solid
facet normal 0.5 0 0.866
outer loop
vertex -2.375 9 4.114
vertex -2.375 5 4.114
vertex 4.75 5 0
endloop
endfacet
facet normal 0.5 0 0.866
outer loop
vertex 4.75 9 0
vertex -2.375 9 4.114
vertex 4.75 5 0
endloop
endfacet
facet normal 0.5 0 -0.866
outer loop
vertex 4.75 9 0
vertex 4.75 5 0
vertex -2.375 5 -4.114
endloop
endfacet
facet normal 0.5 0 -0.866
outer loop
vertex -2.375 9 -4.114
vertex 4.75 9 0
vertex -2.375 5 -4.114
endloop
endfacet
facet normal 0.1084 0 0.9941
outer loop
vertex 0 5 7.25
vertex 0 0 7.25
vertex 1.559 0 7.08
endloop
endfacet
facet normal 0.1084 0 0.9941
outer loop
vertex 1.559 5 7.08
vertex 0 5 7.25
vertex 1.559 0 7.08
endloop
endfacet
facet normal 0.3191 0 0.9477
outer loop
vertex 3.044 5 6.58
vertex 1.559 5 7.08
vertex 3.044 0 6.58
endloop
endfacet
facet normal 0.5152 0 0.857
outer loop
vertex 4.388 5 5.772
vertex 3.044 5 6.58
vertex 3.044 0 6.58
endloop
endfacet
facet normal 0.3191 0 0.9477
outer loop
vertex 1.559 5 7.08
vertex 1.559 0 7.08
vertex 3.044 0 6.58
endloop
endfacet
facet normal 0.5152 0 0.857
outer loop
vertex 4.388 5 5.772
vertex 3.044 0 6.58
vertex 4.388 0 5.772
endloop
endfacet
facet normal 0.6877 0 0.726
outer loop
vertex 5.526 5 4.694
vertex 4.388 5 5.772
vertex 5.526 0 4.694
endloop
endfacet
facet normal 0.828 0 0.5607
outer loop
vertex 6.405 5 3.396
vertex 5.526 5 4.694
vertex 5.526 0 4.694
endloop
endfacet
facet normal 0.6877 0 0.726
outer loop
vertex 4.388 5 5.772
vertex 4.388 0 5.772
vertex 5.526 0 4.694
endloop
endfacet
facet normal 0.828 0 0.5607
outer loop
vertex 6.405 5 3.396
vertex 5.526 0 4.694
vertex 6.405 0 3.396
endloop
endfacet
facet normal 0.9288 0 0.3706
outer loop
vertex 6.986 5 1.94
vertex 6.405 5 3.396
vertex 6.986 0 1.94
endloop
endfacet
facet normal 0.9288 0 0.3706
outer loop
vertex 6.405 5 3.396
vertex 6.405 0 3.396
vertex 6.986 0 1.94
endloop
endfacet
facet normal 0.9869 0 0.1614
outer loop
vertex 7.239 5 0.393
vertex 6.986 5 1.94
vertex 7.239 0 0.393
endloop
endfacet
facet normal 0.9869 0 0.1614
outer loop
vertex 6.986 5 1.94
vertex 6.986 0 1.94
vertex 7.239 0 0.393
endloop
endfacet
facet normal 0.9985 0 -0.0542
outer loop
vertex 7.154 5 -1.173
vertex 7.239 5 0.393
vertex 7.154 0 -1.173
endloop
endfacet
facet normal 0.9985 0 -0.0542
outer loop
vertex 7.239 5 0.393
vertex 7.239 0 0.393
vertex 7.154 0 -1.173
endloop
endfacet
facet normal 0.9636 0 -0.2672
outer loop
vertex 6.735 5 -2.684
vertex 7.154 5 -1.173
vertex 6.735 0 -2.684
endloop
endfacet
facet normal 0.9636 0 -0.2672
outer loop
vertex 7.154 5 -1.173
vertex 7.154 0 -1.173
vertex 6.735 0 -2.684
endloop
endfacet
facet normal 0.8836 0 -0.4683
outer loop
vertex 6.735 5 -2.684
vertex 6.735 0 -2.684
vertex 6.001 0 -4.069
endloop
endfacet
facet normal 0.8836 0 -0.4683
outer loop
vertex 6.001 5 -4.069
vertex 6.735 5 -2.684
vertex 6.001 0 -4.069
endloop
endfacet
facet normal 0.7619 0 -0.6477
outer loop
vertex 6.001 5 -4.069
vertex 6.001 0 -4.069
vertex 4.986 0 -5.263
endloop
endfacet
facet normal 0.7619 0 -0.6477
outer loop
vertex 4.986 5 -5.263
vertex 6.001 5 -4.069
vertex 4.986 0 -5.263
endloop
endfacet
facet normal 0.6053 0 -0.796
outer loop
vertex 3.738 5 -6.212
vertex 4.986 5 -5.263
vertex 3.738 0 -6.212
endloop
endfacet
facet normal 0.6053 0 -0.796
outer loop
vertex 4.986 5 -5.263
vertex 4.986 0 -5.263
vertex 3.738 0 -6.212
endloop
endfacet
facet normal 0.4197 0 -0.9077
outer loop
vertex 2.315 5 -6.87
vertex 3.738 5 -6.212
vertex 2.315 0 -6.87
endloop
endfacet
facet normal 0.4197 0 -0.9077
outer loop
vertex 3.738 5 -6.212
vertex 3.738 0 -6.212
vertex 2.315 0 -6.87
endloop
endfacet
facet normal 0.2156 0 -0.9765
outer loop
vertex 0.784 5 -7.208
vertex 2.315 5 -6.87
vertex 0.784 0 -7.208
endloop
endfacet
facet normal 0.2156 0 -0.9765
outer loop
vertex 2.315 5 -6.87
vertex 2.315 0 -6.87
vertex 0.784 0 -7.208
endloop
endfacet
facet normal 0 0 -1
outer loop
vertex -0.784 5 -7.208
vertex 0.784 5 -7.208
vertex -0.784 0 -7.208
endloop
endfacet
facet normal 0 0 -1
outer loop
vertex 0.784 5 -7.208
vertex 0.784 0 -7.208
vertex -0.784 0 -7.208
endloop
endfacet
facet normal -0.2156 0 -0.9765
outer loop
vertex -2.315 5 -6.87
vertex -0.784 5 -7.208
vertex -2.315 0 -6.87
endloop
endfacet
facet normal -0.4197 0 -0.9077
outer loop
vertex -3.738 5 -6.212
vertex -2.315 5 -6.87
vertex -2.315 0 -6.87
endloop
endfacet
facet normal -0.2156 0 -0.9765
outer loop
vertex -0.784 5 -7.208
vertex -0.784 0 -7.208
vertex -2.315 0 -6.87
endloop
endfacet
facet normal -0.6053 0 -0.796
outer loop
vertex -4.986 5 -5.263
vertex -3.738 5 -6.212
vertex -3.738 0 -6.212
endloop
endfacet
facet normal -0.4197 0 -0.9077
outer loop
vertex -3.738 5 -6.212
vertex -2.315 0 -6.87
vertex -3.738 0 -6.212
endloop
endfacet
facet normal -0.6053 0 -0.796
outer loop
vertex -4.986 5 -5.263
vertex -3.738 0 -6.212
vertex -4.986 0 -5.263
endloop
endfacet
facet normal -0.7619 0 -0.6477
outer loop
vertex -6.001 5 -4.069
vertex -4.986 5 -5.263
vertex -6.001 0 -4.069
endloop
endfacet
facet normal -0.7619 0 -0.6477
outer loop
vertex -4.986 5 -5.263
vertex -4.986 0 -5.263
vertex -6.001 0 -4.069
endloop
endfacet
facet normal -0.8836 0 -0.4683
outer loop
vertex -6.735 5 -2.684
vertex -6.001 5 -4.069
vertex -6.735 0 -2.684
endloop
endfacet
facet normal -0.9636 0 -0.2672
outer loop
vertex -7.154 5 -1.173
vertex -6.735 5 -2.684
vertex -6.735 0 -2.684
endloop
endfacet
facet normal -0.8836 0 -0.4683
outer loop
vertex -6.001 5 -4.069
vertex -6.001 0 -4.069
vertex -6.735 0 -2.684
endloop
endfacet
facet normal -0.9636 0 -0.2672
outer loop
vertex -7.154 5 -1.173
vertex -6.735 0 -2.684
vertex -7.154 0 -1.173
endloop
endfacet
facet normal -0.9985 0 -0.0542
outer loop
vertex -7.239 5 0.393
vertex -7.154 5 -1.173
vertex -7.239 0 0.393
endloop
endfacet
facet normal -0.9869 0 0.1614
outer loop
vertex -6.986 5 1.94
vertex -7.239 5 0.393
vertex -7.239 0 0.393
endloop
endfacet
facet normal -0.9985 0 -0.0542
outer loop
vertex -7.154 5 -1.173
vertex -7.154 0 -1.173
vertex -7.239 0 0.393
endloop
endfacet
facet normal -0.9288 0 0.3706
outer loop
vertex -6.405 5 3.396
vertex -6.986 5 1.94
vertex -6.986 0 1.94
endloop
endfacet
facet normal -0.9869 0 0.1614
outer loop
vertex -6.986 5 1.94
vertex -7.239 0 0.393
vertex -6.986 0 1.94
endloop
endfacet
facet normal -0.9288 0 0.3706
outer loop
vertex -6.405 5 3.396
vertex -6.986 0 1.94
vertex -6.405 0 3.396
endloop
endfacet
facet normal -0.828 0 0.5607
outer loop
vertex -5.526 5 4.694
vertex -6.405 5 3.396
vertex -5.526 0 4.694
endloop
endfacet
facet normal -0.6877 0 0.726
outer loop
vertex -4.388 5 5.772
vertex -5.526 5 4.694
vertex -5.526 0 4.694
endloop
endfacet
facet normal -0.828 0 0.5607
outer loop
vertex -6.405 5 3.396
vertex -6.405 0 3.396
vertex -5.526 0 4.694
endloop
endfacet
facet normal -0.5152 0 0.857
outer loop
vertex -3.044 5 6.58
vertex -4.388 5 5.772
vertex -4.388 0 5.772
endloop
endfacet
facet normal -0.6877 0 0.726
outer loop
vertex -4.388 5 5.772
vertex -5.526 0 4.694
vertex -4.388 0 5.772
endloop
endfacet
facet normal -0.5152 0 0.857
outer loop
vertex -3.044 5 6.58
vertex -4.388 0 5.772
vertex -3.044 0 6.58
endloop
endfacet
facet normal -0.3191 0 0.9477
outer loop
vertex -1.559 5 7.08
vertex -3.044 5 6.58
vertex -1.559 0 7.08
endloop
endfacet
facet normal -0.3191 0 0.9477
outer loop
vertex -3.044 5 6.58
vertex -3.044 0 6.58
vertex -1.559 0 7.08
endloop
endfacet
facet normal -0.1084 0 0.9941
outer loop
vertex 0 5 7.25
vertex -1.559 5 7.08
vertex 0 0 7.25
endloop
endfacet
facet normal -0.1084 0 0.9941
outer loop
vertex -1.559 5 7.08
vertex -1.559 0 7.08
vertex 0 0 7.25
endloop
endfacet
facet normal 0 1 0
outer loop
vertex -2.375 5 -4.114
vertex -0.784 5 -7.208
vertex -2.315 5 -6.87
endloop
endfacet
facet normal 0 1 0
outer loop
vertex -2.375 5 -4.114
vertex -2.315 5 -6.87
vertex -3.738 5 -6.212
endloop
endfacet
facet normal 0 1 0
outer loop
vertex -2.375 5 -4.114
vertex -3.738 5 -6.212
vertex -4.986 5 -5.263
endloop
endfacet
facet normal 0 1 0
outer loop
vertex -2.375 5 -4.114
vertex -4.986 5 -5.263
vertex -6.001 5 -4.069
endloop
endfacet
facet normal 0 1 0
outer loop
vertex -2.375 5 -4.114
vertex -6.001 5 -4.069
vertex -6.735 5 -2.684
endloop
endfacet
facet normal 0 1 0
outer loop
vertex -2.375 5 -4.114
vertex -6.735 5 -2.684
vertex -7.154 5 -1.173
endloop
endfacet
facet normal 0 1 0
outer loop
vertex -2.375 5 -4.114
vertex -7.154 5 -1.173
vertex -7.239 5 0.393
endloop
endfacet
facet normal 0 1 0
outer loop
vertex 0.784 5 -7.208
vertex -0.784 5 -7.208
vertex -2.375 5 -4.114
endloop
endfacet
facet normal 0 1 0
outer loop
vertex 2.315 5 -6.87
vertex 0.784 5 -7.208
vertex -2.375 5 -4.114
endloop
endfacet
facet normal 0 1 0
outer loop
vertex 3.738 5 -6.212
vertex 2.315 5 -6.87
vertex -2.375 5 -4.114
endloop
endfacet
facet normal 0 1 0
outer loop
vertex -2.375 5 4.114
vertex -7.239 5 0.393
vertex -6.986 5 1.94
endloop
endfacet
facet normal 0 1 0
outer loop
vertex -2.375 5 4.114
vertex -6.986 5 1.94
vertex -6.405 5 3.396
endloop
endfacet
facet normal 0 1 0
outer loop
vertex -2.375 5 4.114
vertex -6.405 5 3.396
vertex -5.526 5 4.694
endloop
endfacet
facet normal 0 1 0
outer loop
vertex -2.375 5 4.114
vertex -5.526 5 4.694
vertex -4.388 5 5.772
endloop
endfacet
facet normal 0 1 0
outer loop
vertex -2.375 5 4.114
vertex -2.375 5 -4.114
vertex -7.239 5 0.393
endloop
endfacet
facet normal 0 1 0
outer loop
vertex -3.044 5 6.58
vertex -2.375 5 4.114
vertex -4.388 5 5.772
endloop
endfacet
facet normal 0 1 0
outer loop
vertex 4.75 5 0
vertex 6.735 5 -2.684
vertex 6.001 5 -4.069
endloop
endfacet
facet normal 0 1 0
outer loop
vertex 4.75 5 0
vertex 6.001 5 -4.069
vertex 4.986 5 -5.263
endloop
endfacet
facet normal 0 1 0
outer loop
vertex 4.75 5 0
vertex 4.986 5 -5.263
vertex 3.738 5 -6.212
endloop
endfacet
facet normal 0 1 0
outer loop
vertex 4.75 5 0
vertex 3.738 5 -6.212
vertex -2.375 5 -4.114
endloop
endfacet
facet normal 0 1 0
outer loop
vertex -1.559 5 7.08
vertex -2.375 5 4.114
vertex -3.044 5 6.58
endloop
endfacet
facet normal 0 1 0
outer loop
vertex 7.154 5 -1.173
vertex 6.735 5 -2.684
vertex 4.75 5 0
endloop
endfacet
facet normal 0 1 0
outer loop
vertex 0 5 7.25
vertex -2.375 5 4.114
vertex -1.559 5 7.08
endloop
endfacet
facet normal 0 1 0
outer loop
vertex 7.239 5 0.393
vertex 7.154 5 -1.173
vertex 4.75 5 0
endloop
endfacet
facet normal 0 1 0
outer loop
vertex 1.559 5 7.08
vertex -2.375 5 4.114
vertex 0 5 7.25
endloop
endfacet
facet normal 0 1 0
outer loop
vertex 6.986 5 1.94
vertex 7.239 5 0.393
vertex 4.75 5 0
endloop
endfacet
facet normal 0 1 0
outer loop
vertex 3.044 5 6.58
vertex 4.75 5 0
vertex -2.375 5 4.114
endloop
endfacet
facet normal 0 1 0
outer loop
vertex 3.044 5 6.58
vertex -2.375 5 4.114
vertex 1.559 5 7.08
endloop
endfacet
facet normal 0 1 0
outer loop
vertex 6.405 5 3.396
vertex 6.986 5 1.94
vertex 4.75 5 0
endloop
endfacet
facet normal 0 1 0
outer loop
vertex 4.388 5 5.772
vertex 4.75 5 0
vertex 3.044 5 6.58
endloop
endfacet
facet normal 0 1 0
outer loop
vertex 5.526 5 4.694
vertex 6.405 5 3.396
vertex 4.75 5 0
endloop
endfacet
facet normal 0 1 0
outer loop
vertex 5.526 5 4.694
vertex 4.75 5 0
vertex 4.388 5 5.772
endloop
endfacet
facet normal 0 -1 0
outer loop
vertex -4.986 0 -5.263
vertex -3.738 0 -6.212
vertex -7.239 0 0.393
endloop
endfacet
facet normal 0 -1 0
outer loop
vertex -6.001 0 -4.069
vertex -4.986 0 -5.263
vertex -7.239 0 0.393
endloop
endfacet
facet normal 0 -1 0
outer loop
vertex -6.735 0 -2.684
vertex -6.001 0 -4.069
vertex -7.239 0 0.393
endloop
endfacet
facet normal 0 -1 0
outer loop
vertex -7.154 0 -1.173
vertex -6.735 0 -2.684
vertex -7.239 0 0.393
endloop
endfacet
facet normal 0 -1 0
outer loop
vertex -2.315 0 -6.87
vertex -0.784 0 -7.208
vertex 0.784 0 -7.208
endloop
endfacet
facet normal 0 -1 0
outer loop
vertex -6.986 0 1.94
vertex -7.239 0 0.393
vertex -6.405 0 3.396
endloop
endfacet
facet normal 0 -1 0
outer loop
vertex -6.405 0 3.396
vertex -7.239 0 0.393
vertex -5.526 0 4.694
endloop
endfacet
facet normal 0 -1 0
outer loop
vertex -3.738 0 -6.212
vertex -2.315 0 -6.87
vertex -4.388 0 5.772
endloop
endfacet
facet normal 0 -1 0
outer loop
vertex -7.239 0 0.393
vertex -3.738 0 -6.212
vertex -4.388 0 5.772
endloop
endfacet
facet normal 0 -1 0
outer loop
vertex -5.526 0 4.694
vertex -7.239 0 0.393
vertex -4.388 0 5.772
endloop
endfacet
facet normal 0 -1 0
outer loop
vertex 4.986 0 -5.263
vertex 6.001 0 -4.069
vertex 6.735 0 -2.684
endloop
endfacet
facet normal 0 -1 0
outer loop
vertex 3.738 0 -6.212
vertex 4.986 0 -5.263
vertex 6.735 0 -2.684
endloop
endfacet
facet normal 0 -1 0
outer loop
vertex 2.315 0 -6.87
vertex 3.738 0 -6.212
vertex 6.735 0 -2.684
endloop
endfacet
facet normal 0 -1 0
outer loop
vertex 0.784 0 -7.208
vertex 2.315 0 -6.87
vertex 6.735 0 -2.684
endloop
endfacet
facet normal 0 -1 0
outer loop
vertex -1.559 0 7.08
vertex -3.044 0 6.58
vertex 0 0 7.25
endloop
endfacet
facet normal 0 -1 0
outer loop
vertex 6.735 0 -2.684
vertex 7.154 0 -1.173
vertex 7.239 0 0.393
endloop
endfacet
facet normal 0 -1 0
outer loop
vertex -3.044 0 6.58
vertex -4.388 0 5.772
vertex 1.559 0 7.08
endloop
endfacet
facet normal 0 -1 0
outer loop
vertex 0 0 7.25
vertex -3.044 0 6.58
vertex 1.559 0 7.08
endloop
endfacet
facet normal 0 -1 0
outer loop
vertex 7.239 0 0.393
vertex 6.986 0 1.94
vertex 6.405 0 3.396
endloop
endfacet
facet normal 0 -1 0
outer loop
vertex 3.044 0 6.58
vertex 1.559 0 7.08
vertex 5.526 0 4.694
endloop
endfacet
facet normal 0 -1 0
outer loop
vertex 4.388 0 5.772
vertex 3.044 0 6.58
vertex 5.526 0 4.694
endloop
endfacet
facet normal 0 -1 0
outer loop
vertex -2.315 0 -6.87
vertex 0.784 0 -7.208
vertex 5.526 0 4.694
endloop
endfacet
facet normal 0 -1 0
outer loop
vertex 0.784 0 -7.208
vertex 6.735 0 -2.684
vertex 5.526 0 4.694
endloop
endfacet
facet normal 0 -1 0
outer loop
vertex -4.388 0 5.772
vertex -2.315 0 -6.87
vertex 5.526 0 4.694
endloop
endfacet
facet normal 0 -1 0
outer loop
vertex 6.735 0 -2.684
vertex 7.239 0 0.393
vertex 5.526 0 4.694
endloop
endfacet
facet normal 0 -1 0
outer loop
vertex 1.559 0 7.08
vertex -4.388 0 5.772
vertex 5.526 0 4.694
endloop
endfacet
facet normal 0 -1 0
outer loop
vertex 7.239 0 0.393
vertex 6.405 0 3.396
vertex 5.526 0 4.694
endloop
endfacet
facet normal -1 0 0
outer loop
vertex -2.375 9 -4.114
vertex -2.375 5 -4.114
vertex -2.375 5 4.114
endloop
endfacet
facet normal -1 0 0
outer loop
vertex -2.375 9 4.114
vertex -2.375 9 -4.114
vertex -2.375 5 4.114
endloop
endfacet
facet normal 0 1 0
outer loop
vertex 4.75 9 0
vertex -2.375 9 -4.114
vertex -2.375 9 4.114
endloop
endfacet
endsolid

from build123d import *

# Parameters (mm, degrees)
SKETCH1_R           = 7.25
BOSS_EXTRUDE1_DEPTH = 5
BOSS_EXTRUDE2_DEPTH = 4


with BuildPart() as part:
    # Sketch1 → Boss-Extrude1 (new body)
    with BuildSketch(Plane(origin=(0, 0, 0), x_dir=(1, 0, 0), z_dir=(0, 1, 0))):
        with Locations(Location((0, 0, 0), (0, 0, 270))):
            Circle(SKETCH1_R)
    extrude(amount=BOSS_EXTRUDE1_DEPTH)

    # Sketch2 → Boss-Extrude2 (add)
    with BuildSketch(Plane(origin=(0, 5, 0), x_dir=(1, 0, 0), z_dir=(0, 1, 0))):
        Polygon((4.75, 0), (-2.375, 4.113620668), (-2.375, -4.113620668), align=None)
    extrude(amount=BOSS_EXTRUDE2_DEPTH)


solid = part.part
